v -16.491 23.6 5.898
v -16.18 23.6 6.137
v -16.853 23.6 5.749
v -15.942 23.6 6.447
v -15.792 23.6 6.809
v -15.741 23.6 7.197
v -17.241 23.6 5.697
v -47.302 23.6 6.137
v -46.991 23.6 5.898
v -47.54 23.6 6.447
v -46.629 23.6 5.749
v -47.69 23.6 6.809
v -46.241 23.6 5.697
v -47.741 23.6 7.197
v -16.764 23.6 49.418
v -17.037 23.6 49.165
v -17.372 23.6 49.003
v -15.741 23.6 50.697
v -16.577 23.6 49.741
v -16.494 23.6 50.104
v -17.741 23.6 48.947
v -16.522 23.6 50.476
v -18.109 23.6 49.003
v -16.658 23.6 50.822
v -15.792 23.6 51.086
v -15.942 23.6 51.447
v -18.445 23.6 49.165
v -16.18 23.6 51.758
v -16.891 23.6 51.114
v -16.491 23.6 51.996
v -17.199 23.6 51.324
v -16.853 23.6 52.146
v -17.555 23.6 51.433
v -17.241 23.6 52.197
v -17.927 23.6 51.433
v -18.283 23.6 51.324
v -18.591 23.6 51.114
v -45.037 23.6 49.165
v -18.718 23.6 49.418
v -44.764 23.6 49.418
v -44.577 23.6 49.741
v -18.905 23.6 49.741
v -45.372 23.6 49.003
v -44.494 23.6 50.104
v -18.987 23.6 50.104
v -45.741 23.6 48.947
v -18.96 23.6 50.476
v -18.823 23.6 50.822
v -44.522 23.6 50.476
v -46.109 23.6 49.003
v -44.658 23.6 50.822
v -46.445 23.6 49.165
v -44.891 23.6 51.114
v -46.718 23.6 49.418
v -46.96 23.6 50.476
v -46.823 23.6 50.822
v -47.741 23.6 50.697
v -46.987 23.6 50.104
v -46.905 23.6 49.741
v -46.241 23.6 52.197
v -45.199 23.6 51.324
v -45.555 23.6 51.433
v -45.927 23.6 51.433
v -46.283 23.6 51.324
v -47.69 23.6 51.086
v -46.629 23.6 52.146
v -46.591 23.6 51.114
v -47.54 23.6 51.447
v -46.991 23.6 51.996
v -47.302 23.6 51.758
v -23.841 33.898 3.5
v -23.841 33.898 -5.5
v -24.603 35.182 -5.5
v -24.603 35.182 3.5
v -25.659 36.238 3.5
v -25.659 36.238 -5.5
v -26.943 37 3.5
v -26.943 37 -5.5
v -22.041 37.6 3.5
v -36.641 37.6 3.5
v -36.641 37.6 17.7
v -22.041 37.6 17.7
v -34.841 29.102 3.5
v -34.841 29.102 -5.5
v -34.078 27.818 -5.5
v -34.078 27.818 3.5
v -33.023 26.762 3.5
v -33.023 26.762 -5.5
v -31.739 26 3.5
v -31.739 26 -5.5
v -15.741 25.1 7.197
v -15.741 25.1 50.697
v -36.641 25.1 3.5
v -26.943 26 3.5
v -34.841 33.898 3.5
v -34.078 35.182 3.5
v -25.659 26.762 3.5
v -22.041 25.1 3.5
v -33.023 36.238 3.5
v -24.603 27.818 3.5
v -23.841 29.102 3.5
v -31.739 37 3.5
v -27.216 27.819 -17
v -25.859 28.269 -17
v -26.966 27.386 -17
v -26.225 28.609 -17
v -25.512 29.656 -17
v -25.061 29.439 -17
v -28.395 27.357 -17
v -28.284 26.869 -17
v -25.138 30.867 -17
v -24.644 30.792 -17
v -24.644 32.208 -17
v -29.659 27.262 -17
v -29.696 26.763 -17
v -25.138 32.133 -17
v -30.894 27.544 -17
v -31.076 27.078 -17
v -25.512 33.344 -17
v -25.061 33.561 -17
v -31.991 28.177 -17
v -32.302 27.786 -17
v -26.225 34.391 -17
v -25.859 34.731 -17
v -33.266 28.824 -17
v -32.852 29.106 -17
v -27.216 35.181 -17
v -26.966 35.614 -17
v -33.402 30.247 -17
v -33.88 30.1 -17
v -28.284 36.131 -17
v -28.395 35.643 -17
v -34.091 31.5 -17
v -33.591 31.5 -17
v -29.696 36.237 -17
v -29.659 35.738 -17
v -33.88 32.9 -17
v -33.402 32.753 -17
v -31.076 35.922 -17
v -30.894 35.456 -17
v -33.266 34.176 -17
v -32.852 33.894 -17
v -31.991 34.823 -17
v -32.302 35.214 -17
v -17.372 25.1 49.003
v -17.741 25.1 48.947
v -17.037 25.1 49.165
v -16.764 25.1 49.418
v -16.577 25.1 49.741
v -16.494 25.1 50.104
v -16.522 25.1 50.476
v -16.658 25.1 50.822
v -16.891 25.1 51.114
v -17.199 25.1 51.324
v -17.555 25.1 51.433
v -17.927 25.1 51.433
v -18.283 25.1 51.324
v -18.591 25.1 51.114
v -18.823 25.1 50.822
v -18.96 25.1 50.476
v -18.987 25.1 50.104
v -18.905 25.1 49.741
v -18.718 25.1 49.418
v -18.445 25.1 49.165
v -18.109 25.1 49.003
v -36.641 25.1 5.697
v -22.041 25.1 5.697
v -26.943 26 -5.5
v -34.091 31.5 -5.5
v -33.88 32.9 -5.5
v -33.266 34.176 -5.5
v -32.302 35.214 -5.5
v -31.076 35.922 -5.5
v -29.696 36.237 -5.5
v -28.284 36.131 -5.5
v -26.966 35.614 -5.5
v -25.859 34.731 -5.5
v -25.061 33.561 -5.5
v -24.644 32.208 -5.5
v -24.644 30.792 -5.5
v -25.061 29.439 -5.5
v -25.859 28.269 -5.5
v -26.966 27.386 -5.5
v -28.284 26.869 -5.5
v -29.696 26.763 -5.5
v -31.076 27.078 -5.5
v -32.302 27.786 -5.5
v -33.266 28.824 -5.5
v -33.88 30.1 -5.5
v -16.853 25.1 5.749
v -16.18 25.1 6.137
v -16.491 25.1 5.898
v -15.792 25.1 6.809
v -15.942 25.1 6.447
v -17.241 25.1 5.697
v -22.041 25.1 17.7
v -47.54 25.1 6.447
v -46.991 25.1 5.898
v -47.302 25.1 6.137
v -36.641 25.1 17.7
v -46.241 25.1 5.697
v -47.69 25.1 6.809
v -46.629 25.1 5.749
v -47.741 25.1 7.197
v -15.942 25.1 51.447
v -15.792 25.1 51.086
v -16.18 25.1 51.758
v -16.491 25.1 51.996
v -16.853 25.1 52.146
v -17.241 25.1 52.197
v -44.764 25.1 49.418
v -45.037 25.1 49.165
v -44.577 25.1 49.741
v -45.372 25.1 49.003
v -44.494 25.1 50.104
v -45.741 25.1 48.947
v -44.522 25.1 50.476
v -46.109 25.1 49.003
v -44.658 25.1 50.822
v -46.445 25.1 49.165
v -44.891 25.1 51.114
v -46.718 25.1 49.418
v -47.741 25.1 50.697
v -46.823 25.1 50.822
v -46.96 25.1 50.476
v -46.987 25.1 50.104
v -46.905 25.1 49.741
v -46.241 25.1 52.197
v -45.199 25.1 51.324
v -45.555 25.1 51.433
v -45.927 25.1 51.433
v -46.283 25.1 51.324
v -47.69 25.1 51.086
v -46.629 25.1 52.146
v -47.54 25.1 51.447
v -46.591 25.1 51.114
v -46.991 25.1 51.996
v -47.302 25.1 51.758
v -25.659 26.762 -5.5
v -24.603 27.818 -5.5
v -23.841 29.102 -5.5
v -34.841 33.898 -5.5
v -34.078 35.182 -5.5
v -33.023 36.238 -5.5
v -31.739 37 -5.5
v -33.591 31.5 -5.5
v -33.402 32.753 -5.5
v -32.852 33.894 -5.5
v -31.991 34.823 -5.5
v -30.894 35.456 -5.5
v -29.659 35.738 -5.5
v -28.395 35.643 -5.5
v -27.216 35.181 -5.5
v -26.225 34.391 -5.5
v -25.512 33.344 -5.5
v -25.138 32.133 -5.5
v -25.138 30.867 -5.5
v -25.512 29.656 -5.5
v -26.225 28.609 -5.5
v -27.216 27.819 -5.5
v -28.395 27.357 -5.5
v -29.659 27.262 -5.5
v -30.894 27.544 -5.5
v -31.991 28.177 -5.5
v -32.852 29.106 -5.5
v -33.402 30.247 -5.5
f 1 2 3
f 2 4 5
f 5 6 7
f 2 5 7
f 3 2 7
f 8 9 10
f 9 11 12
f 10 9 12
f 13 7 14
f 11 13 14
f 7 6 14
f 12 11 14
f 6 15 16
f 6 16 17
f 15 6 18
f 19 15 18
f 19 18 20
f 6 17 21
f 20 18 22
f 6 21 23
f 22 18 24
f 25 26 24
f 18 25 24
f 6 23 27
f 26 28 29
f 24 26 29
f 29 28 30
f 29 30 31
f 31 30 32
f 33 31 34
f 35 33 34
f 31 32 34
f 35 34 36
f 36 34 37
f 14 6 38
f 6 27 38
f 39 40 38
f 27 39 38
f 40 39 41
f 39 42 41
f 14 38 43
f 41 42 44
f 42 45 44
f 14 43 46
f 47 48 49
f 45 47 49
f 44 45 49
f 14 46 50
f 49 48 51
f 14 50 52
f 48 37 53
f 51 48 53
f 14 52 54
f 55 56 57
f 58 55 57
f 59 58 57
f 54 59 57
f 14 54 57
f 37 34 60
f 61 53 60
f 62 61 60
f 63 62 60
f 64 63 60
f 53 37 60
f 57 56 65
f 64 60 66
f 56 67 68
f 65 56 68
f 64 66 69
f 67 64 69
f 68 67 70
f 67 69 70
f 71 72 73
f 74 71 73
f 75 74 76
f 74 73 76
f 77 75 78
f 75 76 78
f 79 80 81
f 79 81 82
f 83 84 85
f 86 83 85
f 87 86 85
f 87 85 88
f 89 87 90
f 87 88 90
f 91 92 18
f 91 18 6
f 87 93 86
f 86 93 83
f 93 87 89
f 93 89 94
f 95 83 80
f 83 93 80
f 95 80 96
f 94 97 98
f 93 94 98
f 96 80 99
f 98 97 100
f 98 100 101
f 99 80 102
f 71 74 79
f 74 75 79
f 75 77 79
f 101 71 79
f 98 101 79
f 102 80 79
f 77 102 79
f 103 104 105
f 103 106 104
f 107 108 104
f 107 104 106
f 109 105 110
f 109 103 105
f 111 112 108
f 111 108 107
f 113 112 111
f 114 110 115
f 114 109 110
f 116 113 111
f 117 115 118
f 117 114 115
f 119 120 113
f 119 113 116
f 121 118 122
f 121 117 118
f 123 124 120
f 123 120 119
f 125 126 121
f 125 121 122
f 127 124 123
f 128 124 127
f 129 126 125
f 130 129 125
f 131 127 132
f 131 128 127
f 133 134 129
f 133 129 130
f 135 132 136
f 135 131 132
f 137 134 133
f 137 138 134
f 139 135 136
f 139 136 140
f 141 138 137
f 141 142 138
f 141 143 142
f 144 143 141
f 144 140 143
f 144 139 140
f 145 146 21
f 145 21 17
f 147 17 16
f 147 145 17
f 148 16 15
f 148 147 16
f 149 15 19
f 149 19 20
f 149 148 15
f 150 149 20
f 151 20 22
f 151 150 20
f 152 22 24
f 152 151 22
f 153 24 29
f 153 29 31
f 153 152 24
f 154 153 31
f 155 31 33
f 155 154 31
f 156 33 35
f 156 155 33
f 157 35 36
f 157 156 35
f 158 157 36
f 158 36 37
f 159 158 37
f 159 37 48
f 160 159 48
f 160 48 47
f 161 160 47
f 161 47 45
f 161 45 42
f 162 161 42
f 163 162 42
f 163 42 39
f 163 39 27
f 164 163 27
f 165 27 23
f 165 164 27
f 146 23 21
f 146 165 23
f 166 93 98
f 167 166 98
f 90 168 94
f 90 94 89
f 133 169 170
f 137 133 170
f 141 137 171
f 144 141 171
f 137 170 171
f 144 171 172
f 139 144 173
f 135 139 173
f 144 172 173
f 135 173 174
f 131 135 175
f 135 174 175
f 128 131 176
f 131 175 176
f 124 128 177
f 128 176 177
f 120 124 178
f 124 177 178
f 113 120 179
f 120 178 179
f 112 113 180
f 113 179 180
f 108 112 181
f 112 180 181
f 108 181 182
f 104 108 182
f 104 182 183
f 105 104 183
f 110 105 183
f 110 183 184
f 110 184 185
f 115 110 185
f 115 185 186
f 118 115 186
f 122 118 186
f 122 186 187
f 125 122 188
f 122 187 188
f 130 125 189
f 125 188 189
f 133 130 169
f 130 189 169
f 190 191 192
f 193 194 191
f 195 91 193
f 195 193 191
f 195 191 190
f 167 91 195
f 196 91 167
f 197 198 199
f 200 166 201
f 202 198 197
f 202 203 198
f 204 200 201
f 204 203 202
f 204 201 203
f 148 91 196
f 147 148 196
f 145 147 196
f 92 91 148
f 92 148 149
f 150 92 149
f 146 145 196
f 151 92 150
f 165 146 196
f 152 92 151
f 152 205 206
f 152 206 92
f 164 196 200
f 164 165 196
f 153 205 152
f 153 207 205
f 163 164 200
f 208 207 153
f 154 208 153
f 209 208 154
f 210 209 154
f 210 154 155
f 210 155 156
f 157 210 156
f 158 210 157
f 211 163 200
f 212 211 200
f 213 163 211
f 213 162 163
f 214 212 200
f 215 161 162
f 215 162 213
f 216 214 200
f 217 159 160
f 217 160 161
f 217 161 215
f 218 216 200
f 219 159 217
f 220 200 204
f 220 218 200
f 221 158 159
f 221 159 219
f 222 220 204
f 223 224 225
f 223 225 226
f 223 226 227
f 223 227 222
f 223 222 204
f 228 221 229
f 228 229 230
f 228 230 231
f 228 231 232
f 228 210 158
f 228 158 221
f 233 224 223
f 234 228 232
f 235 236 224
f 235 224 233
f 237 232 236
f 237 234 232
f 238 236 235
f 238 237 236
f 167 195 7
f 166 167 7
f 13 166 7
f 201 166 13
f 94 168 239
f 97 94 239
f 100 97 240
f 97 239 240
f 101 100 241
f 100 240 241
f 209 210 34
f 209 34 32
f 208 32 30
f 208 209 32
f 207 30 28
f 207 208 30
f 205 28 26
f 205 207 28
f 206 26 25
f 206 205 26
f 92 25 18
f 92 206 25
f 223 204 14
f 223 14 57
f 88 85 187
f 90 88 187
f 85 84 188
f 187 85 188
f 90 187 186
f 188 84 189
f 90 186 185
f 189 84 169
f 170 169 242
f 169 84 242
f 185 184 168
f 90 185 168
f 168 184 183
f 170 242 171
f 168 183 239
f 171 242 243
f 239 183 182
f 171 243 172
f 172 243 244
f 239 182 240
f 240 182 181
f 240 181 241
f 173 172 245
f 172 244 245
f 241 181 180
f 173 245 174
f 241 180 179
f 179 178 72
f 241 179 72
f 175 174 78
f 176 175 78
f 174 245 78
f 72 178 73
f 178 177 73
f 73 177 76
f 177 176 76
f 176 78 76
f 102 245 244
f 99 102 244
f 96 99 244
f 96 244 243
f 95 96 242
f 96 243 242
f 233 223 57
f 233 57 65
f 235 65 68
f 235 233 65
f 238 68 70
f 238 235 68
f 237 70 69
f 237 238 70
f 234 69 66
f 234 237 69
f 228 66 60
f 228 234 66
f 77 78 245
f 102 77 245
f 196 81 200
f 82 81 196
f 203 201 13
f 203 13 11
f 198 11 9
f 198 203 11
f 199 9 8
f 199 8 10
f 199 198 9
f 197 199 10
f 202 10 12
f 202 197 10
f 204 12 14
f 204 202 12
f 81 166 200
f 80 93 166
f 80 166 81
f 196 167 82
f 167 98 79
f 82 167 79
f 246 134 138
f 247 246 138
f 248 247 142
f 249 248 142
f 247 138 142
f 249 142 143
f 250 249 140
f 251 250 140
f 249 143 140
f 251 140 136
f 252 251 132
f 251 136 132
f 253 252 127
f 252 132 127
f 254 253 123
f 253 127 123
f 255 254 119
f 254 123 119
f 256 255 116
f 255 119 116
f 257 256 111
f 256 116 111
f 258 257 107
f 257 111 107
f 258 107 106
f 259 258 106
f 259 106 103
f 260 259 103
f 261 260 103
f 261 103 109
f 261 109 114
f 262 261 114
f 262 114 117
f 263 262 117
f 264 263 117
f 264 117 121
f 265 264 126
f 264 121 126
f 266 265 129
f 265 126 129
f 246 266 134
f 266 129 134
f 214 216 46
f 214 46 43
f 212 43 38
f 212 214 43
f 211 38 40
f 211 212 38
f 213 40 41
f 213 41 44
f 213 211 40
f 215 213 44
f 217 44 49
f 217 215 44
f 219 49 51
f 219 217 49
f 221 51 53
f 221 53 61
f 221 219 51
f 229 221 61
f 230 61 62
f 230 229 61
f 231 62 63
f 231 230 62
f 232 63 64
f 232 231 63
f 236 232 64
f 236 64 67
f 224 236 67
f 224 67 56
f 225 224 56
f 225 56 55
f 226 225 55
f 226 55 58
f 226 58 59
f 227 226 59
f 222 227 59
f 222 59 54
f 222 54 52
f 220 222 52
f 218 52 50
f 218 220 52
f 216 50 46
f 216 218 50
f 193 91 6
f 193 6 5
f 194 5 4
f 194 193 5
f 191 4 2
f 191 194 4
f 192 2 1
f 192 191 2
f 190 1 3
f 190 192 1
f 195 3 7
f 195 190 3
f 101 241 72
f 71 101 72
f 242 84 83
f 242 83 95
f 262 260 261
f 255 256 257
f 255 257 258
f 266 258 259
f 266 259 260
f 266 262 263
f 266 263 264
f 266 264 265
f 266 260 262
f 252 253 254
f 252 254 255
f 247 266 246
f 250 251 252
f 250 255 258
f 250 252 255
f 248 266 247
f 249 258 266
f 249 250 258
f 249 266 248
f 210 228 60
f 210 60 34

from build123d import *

# Parameters (mm, degrees)
EXTRUDE_1_DEPTH      = 3.5
EXTRUDE_1_DEPTH_BACK = 5.5
SKETCH_1_R           = 6
SKETCH_2_R           = 4.75
EXTRUDE_2_DEPTH      = 11.5
SKETCH_3_R           = 4.25
CUT_EXTRUDE_1_DEPTH  = 11.5
SKETCH_4_W           = 14.6
SKETCH_4_H           = 12.5
EXTRUDE_3_DEPTH      = 14.2
SKETCH_5_R           = 1.25
EXTRUDE_4_DEPTH      = 1.5
CUT_EXTRUDE_2_DEPTH  = 9


with BuildPart() as part:
    # 草圖1 → 填料-伸長1 (new, two sides: drawn at the far end of the back side and taken through both)
    with BuildSketch(Plane.XY.offset(-EXTRUDE_1_DEPTH_BACK)):
        with Locations((-29.340909091, 31.5)):
            Circle(SKETCH_1_R)
    extrude(amount=EXTRUDE_1_DEPTH + EXTRUDE_1_DEPTH_BACK)

    # 草圖2 → 填料-伸長2 (add)
    with BuildSketch(Plane(origin=(0, 0, -5.5), x_dir=(-1, 0, 0), z_dir=(0, 0, -1))):
        with Locations((29.340909091, 31.5)):
            Circle(SKETCH_2_R)
    extrude(amount=EXTRUDE_2_DEPTH)

    # 草圖3 → 除料-伸長1 (cut)
    with BuildSketch(Plane(origin=(0, 0, -17), x_dir=(-1, 0, 0), z_dir=(0, 0, -1))):
        with Locations((29.340909091, 31.5)):
            Circle(SKETCH_3_R)
    extrude(amount=-CUT_EXTRUDE_1_DEPTH, mode=Mode.SUBTRACT)

    # 草圖4 → 填料-伸長3 (add)
    with BuildSketch(Plane.XY.offset(3.5)):
        with Locations((-29.340909091, 31.35)):
            Rectangle(SKETCH_4_W, SKETCH_4_H)
    extrude(amount=EXTRUDE_3_DEPTH)

    # 草圖5 → 填料-伸長4 (add)
    with BuildSketch(Plane.XZ.offset(-25.1)):
        with BuildLine():
            Line((-17.240909091, 5.697422491), (-46.240909091, 5.697422491))
            ThreePointArc((-46.240909091, 5.697422491), (-47.301569263, 6.136762319), (-47.740909091, 7.197422491))
            Line((-47.740909091, 7.197422491), (-47.740909091, 50.697422491))
            ThreePointArc((-47.740909091, 50.697422491), (-47.301569263, 51.758082663), (-46.240909091, 52.197422491))
            Line((-46.240909091, 52.197422491), (-17.240909091, 52.197422491))
            ThreePointArc((-17.240909091, 52.197422491), (-16.180248919, 51.758082663), (-15.740909091, 50.697422491))
            Line((-15.740909091, 50.697422491), (-15.740909091, 7.197422491))
            ThreePointArc((-15.740909091, 7.197422491), (-16.180248919, 6.136762319), (-17.240909091, 5.697422491))
        make_face()
        with Locations(Location((-17.740909091, 50.197422491, 0), (0, 0, 270))):
            Circle(SKETCH_5_R, mode=Mode.SUBTRACT)
        with Locations(Location((-45.740909091, 50.197422491, 0), (0, 0, 270))):
            Circle(SKETCH_5_R, mode=Mode.SUBTRACT)
    extrude(amount=EXTRUDE_4_DEPTH)

    # 草圖6 → 除料-伸長2 (cut)
    with BuildSketch(Plane(origin=(0, 0, -5.5), x_dir=(-1, 0, 0), z_dir=(0, 0, -1))):
        with BuildLine():
            Line((26.942993329, 26), (31.738824853, 26))
            ThreePointArc((31.738824853, 26), (29.340909091, 25.5), (26.942993329, 26))
        make_face()
        with BuildLine():
            Line((23.840909091, 29.102084238), (23.840909091, 33.897915762))
            ThreePointArc((23.840909091, 33.897915762), (23.340909091, 31.5), (23.840909091, 29.102084238))
        make_face()
        with BuildLine():
            Line((26.942993329, 37), (31.738824853, 37))
            ThreePointArc((31.738824853, 37), (29.340909091, 37.5), (26.942993329, 37))
        make_face()
        with BuildLine():
            Line((34.840909091, 29.102084238), (34.840909091, 33.897915762))
            ThreePointArc((34.840909091, 33.897915762), (35.340909091, 31.5), (34.840909091, 29.102084238))
        make_face()
    extrude(amount=-CUT_EXTRUDE_2_DEPTH, mode=Mode.SUBTRACT)


solid = part.part
